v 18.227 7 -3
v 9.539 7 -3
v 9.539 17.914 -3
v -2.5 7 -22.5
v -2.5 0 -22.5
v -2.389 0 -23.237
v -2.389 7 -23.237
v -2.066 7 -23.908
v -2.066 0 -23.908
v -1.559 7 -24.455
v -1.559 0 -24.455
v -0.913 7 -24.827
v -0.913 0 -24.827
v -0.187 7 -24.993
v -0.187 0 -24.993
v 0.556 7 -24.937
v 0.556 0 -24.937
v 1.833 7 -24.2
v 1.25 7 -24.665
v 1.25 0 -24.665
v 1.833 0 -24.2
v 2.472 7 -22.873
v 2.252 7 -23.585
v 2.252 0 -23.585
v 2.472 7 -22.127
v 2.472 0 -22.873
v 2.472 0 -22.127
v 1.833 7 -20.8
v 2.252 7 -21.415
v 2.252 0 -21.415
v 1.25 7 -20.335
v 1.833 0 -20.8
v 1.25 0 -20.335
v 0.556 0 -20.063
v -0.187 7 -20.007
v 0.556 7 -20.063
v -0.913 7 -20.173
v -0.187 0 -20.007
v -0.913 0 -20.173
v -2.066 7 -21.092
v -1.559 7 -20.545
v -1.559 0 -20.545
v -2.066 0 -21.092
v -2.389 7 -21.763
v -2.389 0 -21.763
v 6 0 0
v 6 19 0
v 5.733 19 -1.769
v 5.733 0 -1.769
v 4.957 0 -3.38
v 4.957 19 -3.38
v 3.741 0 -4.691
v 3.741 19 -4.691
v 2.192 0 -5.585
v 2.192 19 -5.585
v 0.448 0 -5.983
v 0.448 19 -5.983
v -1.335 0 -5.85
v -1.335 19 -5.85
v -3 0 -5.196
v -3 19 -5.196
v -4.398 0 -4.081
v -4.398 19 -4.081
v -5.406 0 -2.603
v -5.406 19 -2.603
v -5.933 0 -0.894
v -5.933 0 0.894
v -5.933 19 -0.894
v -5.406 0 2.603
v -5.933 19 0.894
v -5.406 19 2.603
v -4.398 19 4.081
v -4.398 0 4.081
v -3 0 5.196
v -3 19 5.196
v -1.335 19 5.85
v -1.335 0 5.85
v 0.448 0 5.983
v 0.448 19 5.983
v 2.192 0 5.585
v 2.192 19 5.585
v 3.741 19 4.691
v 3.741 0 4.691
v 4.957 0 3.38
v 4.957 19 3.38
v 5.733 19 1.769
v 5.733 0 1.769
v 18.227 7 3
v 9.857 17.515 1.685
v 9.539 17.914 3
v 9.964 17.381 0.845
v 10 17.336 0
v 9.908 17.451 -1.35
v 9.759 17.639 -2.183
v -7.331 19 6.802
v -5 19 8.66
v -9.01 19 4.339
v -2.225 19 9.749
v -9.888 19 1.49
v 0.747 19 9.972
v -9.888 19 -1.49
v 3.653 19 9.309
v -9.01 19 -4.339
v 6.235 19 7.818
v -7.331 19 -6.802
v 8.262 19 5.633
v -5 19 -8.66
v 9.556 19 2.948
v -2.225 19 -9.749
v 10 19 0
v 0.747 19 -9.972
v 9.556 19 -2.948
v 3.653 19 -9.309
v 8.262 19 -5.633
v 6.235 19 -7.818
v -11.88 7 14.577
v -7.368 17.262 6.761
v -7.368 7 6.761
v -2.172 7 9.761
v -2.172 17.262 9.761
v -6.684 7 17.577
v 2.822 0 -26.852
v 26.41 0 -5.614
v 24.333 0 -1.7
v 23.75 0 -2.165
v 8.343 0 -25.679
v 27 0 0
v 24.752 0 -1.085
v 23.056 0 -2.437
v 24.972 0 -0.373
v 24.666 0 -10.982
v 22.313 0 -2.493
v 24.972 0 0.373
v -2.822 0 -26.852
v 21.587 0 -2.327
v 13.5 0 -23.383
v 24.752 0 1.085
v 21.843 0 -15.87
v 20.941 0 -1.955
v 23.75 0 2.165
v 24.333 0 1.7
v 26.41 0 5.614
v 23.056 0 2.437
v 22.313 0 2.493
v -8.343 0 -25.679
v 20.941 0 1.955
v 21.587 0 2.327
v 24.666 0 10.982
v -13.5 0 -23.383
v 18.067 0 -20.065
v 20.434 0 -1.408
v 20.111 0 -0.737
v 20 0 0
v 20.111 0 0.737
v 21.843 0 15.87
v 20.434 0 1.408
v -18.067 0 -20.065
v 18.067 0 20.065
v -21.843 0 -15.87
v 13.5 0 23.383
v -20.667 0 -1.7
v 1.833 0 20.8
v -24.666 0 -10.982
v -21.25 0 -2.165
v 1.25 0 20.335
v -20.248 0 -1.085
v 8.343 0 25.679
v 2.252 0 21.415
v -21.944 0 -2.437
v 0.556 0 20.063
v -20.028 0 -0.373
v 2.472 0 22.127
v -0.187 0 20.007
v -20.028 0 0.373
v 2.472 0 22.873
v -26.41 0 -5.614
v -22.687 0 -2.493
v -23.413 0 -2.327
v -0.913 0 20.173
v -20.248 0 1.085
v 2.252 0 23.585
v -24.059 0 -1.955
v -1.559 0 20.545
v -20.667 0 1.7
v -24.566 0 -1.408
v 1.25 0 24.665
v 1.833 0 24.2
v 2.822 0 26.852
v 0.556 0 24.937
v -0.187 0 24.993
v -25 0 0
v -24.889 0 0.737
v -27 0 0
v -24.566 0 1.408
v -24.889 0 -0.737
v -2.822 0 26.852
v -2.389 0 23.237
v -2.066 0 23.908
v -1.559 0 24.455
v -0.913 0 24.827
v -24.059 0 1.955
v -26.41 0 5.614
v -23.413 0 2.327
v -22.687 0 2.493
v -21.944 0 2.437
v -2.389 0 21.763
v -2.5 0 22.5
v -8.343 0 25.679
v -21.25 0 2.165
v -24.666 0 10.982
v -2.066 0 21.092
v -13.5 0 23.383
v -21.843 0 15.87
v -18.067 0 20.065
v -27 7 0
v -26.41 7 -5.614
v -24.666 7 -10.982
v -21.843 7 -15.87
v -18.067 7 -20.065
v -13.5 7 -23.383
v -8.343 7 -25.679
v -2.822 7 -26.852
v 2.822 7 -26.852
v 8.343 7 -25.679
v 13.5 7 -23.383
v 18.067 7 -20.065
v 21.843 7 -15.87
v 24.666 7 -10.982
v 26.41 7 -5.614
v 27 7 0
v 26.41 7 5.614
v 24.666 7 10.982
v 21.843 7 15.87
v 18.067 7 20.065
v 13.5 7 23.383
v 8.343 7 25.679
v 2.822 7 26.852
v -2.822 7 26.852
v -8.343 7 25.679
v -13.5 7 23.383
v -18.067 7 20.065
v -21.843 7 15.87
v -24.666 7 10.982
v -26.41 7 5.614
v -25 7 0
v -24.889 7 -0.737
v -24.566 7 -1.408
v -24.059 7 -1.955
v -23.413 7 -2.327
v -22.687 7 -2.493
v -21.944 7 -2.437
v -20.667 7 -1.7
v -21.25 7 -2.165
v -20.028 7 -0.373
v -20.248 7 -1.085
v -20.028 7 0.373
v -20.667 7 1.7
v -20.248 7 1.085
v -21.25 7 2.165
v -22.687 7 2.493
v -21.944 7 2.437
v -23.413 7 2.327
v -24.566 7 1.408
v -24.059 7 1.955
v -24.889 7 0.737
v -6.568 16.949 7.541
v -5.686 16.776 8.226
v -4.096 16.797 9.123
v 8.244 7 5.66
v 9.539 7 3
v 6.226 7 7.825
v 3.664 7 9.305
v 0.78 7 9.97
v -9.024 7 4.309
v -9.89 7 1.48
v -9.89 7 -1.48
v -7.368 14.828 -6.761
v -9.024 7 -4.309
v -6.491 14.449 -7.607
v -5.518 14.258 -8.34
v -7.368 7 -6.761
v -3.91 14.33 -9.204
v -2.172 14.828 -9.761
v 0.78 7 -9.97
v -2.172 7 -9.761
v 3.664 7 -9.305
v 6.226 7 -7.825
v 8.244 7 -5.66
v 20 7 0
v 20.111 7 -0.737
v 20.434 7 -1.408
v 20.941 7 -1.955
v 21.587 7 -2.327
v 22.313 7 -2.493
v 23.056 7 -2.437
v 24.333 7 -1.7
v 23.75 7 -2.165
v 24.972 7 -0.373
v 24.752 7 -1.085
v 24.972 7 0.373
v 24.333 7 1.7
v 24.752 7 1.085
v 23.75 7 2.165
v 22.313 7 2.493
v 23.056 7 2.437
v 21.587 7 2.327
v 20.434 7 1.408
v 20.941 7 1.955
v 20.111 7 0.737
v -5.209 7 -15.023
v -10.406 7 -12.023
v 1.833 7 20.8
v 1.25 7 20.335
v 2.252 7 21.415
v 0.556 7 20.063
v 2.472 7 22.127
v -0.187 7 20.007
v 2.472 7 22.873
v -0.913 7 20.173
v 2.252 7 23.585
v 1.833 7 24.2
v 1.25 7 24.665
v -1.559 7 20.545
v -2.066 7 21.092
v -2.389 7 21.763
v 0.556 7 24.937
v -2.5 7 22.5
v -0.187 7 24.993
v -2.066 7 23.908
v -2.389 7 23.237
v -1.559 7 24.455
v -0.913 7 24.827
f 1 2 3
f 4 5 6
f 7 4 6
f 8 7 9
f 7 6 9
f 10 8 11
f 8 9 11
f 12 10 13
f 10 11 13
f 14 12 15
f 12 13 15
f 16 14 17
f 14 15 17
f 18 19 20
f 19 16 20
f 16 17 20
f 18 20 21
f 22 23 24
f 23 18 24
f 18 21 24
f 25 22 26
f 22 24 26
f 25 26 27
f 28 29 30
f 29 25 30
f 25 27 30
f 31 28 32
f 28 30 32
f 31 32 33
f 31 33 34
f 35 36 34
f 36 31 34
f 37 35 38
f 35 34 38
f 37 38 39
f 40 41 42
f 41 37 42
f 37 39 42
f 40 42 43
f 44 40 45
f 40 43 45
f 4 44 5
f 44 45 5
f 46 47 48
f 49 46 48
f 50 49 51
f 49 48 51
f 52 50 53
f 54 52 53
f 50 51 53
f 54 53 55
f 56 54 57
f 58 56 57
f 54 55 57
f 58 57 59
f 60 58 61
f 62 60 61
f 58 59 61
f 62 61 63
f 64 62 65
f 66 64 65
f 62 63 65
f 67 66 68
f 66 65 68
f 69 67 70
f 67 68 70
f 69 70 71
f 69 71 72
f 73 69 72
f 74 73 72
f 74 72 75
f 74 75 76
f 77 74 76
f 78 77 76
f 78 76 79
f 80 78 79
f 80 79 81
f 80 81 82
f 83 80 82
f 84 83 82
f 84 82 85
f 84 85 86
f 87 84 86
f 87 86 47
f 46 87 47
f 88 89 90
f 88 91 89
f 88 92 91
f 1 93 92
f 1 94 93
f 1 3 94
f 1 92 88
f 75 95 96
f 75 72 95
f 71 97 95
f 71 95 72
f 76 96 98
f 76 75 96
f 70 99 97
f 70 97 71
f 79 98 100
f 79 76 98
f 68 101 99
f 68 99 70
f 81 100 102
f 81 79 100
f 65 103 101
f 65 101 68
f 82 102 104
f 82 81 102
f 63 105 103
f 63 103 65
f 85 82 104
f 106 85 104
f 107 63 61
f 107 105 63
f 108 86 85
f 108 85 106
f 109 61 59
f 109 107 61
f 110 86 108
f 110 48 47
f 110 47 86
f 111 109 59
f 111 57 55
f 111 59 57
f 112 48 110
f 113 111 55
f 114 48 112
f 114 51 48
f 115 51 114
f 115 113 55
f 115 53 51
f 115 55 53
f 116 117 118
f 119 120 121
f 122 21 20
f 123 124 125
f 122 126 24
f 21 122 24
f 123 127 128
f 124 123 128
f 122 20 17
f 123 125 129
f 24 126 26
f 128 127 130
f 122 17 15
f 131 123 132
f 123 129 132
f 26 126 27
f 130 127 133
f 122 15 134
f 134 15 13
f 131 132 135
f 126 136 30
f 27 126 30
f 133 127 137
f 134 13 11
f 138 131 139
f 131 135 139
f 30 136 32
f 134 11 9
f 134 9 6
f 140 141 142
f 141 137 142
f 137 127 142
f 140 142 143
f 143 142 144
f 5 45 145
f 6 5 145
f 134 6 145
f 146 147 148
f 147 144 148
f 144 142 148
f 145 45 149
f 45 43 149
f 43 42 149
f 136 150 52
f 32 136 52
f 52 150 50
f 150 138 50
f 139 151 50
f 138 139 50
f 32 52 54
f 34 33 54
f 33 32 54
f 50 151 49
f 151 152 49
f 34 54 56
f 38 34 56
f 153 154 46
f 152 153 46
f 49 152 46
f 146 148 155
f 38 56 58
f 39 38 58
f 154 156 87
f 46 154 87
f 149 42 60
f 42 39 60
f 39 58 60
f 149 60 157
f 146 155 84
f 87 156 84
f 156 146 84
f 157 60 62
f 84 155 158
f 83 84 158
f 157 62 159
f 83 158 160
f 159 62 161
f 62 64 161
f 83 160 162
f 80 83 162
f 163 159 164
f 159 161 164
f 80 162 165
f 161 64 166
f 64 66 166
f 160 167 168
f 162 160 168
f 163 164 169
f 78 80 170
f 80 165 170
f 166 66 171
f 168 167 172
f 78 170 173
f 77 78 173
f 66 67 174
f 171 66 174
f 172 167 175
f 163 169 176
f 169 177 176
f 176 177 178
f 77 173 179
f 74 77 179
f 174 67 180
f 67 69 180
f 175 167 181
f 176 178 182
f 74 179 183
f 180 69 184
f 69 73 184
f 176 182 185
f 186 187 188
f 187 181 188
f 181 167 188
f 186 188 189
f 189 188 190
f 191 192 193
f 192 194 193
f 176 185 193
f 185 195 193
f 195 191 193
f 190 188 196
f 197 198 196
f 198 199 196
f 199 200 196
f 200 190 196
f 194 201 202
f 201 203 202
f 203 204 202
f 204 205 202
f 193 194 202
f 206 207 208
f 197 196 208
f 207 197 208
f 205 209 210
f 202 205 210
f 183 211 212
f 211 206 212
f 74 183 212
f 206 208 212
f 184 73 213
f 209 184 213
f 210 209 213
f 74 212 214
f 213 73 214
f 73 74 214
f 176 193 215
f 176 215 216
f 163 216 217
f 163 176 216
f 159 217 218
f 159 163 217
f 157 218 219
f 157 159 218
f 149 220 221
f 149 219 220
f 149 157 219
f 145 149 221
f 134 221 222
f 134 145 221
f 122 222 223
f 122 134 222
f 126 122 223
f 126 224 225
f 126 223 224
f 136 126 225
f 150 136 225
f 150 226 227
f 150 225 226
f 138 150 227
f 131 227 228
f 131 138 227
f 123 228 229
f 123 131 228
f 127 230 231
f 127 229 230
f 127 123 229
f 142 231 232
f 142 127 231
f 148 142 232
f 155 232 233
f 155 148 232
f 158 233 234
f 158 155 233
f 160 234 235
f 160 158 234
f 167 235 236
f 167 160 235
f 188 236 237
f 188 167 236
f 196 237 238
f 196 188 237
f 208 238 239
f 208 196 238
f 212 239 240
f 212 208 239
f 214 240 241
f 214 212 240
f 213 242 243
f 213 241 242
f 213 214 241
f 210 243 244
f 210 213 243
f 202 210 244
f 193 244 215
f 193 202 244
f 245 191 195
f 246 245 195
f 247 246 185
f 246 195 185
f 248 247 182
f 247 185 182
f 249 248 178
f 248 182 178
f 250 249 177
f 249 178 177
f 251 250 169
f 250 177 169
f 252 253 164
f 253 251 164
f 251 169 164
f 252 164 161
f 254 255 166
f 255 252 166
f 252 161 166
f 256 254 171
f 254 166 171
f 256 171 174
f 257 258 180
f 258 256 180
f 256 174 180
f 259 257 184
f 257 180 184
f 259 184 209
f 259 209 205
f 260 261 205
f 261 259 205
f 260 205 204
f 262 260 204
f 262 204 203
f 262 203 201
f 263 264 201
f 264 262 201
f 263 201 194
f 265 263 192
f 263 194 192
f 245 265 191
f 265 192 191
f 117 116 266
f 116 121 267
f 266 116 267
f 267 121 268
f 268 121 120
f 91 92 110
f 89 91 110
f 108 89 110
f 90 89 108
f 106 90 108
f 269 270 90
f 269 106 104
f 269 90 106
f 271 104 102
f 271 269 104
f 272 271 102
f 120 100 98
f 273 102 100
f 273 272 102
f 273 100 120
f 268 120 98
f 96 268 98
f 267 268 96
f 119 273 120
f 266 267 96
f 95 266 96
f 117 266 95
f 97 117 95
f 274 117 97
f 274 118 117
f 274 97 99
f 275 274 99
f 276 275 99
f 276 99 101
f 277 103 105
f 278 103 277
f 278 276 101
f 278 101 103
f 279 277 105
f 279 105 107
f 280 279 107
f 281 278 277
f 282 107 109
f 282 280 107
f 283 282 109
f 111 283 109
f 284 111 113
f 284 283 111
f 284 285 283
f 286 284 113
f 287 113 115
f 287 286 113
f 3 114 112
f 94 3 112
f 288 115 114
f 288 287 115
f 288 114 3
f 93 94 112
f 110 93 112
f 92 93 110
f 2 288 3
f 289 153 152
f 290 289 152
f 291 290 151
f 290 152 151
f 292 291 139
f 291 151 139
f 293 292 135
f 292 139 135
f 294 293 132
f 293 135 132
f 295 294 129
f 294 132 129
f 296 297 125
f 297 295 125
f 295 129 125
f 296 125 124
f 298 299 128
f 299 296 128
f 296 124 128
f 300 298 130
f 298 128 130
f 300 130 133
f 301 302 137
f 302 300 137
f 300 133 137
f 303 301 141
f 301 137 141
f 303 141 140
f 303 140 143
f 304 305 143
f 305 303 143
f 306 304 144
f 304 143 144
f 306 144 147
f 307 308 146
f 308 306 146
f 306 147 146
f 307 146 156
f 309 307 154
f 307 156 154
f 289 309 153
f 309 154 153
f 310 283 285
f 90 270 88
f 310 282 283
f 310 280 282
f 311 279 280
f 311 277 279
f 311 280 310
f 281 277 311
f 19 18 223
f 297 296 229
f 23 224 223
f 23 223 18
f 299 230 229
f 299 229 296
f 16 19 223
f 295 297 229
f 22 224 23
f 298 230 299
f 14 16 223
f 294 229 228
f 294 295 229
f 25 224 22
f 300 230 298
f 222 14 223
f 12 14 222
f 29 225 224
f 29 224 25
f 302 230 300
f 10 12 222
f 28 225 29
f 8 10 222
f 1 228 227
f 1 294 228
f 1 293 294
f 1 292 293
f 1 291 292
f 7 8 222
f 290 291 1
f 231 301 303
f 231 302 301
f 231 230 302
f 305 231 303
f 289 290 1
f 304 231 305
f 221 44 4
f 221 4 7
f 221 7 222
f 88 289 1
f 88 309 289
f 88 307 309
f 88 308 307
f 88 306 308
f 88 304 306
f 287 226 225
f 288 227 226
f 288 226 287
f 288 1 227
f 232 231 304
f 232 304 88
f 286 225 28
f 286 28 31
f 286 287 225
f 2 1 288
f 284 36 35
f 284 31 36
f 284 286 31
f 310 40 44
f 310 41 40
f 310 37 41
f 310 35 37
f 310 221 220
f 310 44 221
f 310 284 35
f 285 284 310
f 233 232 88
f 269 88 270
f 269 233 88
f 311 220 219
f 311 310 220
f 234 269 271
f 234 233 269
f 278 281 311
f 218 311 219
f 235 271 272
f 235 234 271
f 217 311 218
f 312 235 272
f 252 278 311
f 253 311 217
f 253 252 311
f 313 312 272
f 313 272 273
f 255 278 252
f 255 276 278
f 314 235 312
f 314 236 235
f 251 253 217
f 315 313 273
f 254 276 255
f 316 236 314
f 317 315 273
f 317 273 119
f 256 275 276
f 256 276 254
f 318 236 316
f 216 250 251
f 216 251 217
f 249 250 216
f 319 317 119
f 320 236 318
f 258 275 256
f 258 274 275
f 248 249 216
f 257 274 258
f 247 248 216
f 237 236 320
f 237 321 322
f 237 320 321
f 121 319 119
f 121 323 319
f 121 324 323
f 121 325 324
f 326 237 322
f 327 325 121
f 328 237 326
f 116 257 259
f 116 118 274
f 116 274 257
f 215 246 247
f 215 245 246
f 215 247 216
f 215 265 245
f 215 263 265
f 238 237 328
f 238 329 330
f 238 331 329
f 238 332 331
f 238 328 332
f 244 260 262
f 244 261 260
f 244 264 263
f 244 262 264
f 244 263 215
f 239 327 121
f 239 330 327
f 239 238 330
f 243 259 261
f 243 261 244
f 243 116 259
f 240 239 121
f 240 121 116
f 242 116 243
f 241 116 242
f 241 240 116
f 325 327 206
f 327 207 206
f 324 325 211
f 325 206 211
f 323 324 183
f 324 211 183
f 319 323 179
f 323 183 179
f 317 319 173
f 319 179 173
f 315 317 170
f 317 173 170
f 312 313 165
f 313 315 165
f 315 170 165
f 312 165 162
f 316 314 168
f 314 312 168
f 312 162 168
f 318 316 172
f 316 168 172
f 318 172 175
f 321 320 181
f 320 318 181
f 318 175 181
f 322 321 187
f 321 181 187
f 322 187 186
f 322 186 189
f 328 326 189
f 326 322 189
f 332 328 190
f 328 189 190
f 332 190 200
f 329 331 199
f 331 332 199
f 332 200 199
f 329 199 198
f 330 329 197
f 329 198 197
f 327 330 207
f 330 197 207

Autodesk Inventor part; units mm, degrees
ref_plane "YZ Plane" through (0, 0, 0) normal (1, 0, 0) x (0, 1, 0)
ref_plane "XZ Plane" through (0, 0, 0) normal (0, 1, 0) x (-1, 0, 0)
sketch "草图1" plane through (0, 0, 0) normal (0, 1, 0) x (-1, 0, 0)
  circle A0 centre (0, 0) radius 27
  circle A1 centre (0, 0) radius 22.5 construction
  circle A2 centre (22.5, 0) radius 2.5
  circle A3 centre (0, -22.5) radius 2.5
  circle A4 centre (-22.5, 0) radius 2.5
  circle A5 centre (0, 22.5) radius 2.5
  dimension "d0" = 54
  dimension "d1" = 45
  dimension "d2" = 5
  dimension "d3" = 5
  dimension "d4" = 5
  dimension "d5" = 5
extrude "拉伸1" add sketch "草图1" along normal blind 7
sketch "草图2" plane through (0, 7, 0) normal (0, 1, 0) x (1, 0, 0)
  circle A0 centre (0, 0) radius 27 projected
  circle A1 centre (0, 0) radius 10
  dimension "d8" = 20
extrude "拉伸2" add sketch "草图2" along normal blind 12 contours A1
sketch "草图3" plane through (0, 19, 0) normal (0, 1, 0) x (1, 0, 0)
  circle A0 centre (0, 0) radius 10 projected
  circle A1 centre (0, 0) radius 6
  dimension "d11" = 12
extrude "拉伸3" cut sketch "草图3" against normal blind 19 contours A1
sketch "草图4" plane through (0, 0, 0) normal (0, 0, 1) x (1, 0, 0)
  line L0 (10, 19) -> (-10, 19) projected
  line L1 (-10, 7) -> (10, 7) projected
  line L2 (27, 7) -> (-27, 7) projected
  line L3 (-27, 0) -> (27, 0) projected
  line L4 (8.6752, 19) -> (8.6752, 7)
  line L5 (8.6752, 19) -> (18.2273, 7)
  line L6 (8.6752, 7) -> (18.2273, 7)
  point P0 (0, 0)
extrude "拉伸4" add sketch "草图4" along normal mid plane 6
ref_plane "工作平面1" through (0, 19, 0) normal (-0.866, 0, -0.5) x (0, -1, 0)
sketch "草图5" plane through (0, 19, 0) normal (-0.866, 0, -0.5) x (0, -1, 0)
  point P0 (19, 0)
sketch "草图6" plane through (0, 19, 0) normal (-0.866, 0, -0.5) x (0, -1, 0)
  point P0 (19, 0)
sketch "草图7" plane through (0, 19, 0) normal (-0.866, 0, -0.5) x (0, -1, 0)
  line L0 (12, -2.1716) -> (1.0857, -2.1716) projected
  ellipse E0 centre (-10.8983, 0) end of major axis (-22.7486, 7.5911) minor radius 7.7307 (1.0857, -7.3678) -> (1.0857, -2.1716) ccw projected
  line L1 (1.0857, -7.3678) -> (12, -7.3678) projected
  line L2 (12, -2.1716) -> (12, -7.3678) projected
  line L3 (0, 10) -> (0, -10) projected
  line L4 (12, 27) -> (12, -27) projected
  line L5 (19, -27) -> (19, 27) projected
  line L6 (0, 8.0111) -> (12, 8.0111)
  line L7 (12, 18.564) -> (0, 8.0111)
  line L8 (12, 18.564) -> (12, 8.0111)
  point P0 (19, 0)
extrude "拉伸5" add sketch "草图7" along normal mid plane 6 contours L6 L7 L4
ref_plane "工作平面2" through (0, 19, 0) normal (0.866, 0, -0.5) x (0, -1, 0)
sketch "草图8" plane through (0, 19, 0) normal (0.866, 0, -0.5) x (0, -1, 0)
  line L0 (0, 10) -> (0, -10) projected
  line L1 (12, -2.1716) -> (1.7379, -2.1716) projected
  ellipse E0 centre (-9.1096, 0) end of major axis (1.2979, -8.0654) minor radius 7.4792 (1.7379, -7.3678) -> (1.7379, -2.1716) ccw projected
  line L2 (1.7379, -7.3678) -> (12, -7.3678) projected
  line L3 (12, -7.3678) -> (12, -7.3678) projected
  line L4 (12, -7.3678) -> (1.0857, -7.3678) projected
  ellipse E1 centre (-10.8983, 0) end of major axis (-22.7486, 7.5911) minor radius 7.7307 (1.0857, -7.3678) -> (1.0857, -2.1716) ccw projected
  line L5 (1.0857, -2.1716) -> (12, -2.1716) projected
  line L6 (12, -2.1716) -> (12, -2.1716) projected
  line L7 (12, 27) -> (12, -27) projected
  line L8 (19, -27) -> (19, 27) projected
  line L9 (0, 6.3008) -> (12, 6.3008)
  line L10 (0, 6.3008) -> (12, 15.6151)
  line L11 (12, 15.6151) -> (12, 6.3008)
  point P0 (19, 0)
extrude "拉伸6" add sketch "草图8" along normal mid plane 6 contours L9 L10 L7
